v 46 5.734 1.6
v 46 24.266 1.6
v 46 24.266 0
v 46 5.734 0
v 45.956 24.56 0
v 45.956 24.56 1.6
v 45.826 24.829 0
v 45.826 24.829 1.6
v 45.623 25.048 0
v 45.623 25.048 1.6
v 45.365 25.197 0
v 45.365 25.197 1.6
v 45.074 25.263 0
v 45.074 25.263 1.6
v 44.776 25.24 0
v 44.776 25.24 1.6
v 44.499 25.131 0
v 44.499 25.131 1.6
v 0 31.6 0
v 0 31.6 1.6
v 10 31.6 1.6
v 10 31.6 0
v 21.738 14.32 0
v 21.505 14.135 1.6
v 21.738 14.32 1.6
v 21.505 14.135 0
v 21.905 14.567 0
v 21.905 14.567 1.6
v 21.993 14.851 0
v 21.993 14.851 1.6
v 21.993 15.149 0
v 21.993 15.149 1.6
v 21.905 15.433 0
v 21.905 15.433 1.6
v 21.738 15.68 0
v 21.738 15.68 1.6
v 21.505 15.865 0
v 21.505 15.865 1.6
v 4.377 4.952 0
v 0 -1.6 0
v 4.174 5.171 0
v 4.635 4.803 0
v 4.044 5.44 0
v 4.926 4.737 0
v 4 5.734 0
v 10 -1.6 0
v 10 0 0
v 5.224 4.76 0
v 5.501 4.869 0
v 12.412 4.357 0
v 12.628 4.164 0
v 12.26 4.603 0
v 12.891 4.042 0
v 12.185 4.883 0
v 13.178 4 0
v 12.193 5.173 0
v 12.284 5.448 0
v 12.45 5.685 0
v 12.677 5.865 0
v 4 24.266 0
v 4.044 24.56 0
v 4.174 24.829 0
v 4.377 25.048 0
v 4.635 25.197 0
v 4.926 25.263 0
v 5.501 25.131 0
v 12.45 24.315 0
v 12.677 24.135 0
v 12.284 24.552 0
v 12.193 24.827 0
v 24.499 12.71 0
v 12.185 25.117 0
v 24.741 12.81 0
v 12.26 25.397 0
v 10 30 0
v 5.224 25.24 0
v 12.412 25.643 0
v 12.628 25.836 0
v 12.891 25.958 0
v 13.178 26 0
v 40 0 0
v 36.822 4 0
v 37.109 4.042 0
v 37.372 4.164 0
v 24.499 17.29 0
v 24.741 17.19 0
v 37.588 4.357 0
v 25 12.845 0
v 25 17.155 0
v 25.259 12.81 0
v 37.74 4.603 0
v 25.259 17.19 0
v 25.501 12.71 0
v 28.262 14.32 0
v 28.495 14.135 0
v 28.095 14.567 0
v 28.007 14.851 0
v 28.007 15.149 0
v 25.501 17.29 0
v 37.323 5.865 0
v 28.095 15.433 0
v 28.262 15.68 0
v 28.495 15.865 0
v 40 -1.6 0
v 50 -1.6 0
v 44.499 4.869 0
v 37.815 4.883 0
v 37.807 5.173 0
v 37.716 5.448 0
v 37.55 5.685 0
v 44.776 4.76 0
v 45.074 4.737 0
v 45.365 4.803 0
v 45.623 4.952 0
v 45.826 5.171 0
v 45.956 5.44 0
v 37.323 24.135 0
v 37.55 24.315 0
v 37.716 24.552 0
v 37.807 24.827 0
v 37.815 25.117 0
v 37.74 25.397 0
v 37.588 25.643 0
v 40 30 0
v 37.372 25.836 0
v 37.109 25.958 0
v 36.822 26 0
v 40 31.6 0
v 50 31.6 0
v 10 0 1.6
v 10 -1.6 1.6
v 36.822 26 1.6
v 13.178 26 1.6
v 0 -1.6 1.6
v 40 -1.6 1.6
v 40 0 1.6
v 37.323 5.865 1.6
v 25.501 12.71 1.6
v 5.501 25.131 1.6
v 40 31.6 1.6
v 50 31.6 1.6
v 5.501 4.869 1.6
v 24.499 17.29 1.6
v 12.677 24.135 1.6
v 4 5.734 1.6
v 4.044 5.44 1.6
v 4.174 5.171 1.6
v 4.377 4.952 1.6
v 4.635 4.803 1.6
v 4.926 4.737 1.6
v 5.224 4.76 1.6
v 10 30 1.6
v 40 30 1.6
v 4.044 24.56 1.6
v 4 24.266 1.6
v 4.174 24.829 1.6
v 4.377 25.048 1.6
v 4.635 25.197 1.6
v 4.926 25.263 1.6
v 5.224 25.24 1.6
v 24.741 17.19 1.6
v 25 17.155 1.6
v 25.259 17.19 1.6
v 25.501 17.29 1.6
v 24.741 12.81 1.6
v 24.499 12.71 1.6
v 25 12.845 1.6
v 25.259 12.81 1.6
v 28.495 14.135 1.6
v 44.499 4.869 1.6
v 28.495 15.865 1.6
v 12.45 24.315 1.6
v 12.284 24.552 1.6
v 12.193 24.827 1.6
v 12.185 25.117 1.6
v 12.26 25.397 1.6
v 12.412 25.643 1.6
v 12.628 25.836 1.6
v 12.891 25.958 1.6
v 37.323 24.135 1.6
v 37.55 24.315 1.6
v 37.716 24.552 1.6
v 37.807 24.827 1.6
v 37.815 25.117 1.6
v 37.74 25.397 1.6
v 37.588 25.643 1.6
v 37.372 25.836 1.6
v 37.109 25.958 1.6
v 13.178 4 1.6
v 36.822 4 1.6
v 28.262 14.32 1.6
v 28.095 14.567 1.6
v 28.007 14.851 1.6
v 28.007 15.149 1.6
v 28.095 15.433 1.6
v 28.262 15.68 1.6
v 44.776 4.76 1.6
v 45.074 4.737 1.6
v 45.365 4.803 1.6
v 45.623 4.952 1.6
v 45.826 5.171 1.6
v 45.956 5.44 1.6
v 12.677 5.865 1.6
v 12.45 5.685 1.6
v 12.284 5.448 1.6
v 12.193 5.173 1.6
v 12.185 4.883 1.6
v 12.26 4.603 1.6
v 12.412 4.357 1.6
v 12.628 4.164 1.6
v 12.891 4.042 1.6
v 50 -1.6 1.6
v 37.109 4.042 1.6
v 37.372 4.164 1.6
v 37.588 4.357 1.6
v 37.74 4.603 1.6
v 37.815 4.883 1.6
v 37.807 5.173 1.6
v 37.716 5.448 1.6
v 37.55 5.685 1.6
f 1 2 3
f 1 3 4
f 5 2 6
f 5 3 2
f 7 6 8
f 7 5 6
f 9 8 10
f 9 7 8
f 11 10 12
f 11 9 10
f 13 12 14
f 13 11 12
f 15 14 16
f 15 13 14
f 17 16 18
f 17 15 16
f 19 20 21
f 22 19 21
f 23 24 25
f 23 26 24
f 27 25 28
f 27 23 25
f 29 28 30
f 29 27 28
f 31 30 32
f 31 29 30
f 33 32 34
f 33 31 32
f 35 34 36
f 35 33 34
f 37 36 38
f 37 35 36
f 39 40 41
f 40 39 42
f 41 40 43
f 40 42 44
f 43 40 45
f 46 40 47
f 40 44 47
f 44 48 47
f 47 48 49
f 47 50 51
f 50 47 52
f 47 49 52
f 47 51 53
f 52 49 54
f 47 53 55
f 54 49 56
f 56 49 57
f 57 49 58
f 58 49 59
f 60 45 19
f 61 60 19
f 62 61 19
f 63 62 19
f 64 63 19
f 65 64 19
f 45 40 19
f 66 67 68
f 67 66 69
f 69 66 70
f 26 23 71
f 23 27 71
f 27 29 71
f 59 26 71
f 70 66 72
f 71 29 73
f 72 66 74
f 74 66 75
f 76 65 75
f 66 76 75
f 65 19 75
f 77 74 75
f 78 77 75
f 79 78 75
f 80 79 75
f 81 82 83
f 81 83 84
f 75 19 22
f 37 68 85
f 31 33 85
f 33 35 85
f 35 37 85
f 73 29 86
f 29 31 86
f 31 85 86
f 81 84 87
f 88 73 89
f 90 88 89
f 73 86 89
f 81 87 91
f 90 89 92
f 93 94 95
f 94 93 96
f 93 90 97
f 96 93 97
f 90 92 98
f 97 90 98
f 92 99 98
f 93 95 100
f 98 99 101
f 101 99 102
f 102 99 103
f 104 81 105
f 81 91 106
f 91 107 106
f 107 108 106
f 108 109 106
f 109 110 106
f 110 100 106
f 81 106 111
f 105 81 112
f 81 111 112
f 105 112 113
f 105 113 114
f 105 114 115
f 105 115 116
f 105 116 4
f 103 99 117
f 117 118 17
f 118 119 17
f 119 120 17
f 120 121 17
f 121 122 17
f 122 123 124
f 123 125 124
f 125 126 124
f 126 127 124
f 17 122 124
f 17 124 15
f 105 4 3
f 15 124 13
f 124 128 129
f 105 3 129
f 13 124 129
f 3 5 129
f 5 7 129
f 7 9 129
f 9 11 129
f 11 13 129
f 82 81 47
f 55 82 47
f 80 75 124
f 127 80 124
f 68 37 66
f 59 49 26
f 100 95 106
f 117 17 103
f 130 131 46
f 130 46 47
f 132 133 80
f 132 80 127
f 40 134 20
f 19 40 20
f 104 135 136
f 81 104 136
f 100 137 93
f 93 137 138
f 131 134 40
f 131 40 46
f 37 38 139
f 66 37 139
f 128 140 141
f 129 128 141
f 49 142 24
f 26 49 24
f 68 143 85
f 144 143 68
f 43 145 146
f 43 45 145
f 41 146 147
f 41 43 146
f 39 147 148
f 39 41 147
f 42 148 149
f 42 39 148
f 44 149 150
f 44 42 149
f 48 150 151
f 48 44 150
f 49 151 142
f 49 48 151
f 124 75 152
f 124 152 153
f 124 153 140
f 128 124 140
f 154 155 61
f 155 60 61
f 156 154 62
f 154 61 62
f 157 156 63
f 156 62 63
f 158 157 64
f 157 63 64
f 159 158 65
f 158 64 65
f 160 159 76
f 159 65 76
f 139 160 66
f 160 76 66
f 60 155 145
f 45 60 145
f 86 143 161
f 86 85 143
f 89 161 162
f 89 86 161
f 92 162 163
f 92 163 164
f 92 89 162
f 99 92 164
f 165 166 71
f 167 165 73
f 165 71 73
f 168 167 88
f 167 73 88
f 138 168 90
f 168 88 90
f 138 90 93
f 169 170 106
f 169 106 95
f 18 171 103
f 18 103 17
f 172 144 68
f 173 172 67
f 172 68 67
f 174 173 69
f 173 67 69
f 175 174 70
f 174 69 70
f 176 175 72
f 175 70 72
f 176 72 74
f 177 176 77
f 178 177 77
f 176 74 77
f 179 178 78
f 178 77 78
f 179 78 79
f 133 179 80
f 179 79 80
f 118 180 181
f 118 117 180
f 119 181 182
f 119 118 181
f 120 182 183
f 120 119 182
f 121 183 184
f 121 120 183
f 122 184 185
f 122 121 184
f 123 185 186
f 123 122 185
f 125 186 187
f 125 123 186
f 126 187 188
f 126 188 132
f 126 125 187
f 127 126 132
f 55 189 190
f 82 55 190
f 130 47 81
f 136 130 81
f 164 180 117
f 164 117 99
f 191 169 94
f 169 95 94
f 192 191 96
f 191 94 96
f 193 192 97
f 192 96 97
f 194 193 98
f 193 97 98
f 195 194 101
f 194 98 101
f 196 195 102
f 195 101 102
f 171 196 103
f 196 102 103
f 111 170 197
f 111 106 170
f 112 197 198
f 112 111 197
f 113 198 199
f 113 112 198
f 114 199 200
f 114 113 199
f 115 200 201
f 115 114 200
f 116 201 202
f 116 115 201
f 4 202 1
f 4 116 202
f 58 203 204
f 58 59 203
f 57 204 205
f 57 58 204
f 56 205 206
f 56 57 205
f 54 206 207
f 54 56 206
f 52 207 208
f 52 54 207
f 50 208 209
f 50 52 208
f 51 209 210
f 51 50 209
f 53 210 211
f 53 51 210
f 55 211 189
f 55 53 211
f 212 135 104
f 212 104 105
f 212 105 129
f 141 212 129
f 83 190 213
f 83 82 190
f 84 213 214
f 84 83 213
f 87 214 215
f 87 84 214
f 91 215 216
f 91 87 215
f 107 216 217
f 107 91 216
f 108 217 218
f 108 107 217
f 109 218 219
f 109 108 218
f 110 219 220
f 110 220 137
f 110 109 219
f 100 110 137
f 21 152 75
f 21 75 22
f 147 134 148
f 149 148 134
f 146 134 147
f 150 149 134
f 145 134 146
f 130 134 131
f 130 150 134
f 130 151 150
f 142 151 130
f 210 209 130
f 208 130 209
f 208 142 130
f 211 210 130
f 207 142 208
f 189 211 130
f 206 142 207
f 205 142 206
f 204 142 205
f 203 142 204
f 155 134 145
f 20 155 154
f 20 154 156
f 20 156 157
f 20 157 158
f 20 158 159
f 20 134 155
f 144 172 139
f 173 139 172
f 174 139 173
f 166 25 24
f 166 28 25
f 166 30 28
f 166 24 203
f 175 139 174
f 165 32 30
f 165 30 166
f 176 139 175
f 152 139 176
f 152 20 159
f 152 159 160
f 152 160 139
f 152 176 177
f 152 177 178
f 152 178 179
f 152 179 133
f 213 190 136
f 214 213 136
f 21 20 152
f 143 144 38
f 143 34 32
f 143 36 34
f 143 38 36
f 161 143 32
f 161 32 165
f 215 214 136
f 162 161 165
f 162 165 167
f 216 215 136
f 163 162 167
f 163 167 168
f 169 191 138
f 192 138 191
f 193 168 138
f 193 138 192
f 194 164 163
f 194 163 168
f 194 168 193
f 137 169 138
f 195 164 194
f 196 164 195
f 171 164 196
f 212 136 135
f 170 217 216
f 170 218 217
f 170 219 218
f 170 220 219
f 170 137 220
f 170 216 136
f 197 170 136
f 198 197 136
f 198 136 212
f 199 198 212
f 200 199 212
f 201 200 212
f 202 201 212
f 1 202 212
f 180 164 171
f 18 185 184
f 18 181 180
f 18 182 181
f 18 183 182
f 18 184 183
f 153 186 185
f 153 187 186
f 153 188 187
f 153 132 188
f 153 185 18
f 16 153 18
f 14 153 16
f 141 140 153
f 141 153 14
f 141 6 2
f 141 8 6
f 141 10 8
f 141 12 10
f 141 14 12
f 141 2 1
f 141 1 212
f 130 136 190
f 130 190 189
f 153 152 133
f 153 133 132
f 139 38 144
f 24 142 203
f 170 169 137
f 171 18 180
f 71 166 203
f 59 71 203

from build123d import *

# Parameters (mm, degrees)
SKETCH1_W           = 50
SKETCH1_H           = 30
BOSS_EXTRUDE1_DEPTH = 1.6
SKETCH2_W           = 10
SKETCH2_H           = 1.6
BOSS_EXTRUDE2_DEPTH = 1.6
CUT_EXTRUDE1_DEPTH  = 60.170262802
FILLET1_R           = 1


with BuildPart() as part:
    # Sketch1 → Boss-Extrude1 (new body)
    with BuildSketch(Plane.XY):
        with Locations((25, 15)):
            Rectangle(SKETCH1_W, SKETCH1_H)
    extrude(amount=BOSS_EXTRUDE1_DEPTH)

    # Sketch2 → Boss-Extrude2 (add)
    with BuildSketch(Plane.XY.offset(1.6)):
        with Locations((5, 30.8)):
            Rectangle(SKETCH2_W, SKETCH2_H)
        with Locations((45, 30.8)):
            Rectangle(SKETCH2_W, SKETCH2_H)
        with Locations((45, -0.8)):
            Rectangle(SKETCH2_W, SKETCH2_H)
        with Locations((5, -0.8)):
            Rectangle(SKETCH2_W, SKETCH2_H)
    extrude(amount=-BOSS_EXTRUDE2_DEPTH)

    # Sketch3 → Cut-Extrude1 (cut, through all)
    with BuildSketch(Plane.XY.offset(1.6)):
        Polygon((4, 26), (4, 4), (23, 15), align=None)
        Polygon((9.454545455, 26), (40.545454545, 26), (25, 17), align=None)
        Polygon((25, 13), (9.454545455, 4), (40.545454545, 4), align=None)
        Polygon((27, 15), (46, 26), (46, 4), align=None)
    extrude(amount=-CUT_EXTRUDE1_DEPTH, mode=Mode.SUBTRACT)

    # Fillet1
    fillet1_edges = [part.edges().sort_by_distance(p)[0] for p in [
        (46, 4, 0.8),
        (27, 15, 0.8),
        (46, 26, 0.8),
        (25, 17, 0.8),
        (9.454545455, 26, 0.8),
        (40.545454545, 26, 0.8),
        (25, 13, 0.8),
        (40.545454545, 4, 0.8),
        (9.454545455, 4, 0.8),
        (4, 26, 0.8),
        (23, 15, 0.8),
        (4, 4, 0.8),
    ]]
    fillet(fillet1_edges, radius=FILLET1_R)


solid = part.part
